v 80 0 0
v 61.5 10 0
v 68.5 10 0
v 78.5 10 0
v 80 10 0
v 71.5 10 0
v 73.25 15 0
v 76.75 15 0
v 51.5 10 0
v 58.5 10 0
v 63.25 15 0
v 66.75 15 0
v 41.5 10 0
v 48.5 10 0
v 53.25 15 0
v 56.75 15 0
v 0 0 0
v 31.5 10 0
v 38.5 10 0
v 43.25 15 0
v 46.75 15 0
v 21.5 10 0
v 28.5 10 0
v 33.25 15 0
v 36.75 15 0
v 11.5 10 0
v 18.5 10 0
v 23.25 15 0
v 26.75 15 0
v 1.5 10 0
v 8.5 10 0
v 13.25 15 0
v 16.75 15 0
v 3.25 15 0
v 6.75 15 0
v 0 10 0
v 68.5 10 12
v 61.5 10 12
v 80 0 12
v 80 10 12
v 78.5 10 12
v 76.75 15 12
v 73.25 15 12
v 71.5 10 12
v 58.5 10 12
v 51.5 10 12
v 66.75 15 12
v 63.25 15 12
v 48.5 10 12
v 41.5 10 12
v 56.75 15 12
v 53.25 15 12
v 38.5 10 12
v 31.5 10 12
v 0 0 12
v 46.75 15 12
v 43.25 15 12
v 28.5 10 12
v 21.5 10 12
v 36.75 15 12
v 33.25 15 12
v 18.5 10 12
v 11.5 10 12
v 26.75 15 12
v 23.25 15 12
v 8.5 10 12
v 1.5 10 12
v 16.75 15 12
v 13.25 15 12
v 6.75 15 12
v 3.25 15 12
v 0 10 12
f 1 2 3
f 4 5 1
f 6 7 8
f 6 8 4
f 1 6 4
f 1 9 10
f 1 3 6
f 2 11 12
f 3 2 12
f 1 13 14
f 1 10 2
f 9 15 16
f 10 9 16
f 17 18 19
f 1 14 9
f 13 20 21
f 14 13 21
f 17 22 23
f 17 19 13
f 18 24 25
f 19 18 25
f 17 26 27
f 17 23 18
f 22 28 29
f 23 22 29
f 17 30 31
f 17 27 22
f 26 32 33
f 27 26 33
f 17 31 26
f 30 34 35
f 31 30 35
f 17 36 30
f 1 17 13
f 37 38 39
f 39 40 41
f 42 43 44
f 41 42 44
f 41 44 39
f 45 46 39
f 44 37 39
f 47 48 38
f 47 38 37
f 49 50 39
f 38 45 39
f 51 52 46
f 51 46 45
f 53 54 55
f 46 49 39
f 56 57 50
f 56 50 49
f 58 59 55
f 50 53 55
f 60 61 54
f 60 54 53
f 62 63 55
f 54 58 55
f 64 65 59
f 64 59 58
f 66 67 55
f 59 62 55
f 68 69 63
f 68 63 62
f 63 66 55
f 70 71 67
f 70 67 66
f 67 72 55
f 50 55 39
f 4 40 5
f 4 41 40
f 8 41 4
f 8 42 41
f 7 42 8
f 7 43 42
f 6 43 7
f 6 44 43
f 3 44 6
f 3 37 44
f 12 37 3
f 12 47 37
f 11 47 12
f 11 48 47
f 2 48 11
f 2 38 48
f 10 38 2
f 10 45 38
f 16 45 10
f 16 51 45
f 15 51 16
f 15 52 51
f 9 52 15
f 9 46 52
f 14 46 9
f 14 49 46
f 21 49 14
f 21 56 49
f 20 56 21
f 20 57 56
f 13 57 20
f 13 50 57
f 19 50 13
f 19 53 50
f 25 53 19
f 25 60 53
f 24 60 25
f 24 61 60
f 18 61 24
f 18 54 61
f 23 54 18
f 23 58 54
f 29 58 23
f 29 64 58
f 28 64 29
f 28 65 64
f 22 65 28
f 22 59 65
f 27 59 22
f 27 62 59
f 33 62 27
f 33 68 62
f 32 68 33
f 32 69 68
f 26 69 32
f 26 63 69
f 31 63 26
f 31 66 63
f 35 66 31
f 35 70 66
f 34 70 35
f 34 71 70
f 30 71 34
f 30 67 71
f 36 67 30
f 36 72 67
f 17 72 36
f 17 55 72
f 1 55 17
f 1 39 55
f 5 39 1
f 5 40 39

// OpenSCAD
$fn = 32;

// ----------------------------------------------------------------------
// Gear rack: 8 teeth, pitch 10 mm
// ----------------------------------------------------------------------

// --- parameters (mm) ---
teeth = 8;                // number of teeth
pitch = 10;               // tooth pitch, X
root_w = 7;               // tooth width at the root
tip_w = 3.5;              // tooth width at the tip
base_h = 10;              // rack body height, Y
tooth_h = 5;              // tooth height above the body
plate_t = 12;             // rack width, Z (extrusion height)
fit_tol = 0.1;            // declared fit tolerance (prompt contract)
free_tol = 0.3;           // declared free tolerance (prompt contract)

rack_l = teeth * pitch;  // overall length
total_h = base_h + tooth_h;  // overall height

profile = [[0, 0], [80, 0], [80, 10], [78.5, 10], [76.75, 15], [73.25, 15], [71.5, 10], [68.5, 10], [66.75, 15], [63.25, 15], [61.5, 10], [58.5, 10], [56.75, 15], [53.25, 15], [51.5, 10], [48.5, 10], [46.75, 15], [43.25, 15], [41.5, 10], [38.5, 10], [36.75, 15], [33.25, 15], [31.5, 10], [28.5, 10], [26.75, 15], [23.25, 15], [21.5, 10], [18.5, 10], [16.75, 15], [13.25, 15], [11.5, 10], [8.5, 10], [6.75, 15], [3.25, 15], [1.5, 10], [0, 10]];  // primary outline, 36 points, counter clockwise

// --- the one profile operation ---
linear_extrude(height = plate_t) polygon(points = profile);
